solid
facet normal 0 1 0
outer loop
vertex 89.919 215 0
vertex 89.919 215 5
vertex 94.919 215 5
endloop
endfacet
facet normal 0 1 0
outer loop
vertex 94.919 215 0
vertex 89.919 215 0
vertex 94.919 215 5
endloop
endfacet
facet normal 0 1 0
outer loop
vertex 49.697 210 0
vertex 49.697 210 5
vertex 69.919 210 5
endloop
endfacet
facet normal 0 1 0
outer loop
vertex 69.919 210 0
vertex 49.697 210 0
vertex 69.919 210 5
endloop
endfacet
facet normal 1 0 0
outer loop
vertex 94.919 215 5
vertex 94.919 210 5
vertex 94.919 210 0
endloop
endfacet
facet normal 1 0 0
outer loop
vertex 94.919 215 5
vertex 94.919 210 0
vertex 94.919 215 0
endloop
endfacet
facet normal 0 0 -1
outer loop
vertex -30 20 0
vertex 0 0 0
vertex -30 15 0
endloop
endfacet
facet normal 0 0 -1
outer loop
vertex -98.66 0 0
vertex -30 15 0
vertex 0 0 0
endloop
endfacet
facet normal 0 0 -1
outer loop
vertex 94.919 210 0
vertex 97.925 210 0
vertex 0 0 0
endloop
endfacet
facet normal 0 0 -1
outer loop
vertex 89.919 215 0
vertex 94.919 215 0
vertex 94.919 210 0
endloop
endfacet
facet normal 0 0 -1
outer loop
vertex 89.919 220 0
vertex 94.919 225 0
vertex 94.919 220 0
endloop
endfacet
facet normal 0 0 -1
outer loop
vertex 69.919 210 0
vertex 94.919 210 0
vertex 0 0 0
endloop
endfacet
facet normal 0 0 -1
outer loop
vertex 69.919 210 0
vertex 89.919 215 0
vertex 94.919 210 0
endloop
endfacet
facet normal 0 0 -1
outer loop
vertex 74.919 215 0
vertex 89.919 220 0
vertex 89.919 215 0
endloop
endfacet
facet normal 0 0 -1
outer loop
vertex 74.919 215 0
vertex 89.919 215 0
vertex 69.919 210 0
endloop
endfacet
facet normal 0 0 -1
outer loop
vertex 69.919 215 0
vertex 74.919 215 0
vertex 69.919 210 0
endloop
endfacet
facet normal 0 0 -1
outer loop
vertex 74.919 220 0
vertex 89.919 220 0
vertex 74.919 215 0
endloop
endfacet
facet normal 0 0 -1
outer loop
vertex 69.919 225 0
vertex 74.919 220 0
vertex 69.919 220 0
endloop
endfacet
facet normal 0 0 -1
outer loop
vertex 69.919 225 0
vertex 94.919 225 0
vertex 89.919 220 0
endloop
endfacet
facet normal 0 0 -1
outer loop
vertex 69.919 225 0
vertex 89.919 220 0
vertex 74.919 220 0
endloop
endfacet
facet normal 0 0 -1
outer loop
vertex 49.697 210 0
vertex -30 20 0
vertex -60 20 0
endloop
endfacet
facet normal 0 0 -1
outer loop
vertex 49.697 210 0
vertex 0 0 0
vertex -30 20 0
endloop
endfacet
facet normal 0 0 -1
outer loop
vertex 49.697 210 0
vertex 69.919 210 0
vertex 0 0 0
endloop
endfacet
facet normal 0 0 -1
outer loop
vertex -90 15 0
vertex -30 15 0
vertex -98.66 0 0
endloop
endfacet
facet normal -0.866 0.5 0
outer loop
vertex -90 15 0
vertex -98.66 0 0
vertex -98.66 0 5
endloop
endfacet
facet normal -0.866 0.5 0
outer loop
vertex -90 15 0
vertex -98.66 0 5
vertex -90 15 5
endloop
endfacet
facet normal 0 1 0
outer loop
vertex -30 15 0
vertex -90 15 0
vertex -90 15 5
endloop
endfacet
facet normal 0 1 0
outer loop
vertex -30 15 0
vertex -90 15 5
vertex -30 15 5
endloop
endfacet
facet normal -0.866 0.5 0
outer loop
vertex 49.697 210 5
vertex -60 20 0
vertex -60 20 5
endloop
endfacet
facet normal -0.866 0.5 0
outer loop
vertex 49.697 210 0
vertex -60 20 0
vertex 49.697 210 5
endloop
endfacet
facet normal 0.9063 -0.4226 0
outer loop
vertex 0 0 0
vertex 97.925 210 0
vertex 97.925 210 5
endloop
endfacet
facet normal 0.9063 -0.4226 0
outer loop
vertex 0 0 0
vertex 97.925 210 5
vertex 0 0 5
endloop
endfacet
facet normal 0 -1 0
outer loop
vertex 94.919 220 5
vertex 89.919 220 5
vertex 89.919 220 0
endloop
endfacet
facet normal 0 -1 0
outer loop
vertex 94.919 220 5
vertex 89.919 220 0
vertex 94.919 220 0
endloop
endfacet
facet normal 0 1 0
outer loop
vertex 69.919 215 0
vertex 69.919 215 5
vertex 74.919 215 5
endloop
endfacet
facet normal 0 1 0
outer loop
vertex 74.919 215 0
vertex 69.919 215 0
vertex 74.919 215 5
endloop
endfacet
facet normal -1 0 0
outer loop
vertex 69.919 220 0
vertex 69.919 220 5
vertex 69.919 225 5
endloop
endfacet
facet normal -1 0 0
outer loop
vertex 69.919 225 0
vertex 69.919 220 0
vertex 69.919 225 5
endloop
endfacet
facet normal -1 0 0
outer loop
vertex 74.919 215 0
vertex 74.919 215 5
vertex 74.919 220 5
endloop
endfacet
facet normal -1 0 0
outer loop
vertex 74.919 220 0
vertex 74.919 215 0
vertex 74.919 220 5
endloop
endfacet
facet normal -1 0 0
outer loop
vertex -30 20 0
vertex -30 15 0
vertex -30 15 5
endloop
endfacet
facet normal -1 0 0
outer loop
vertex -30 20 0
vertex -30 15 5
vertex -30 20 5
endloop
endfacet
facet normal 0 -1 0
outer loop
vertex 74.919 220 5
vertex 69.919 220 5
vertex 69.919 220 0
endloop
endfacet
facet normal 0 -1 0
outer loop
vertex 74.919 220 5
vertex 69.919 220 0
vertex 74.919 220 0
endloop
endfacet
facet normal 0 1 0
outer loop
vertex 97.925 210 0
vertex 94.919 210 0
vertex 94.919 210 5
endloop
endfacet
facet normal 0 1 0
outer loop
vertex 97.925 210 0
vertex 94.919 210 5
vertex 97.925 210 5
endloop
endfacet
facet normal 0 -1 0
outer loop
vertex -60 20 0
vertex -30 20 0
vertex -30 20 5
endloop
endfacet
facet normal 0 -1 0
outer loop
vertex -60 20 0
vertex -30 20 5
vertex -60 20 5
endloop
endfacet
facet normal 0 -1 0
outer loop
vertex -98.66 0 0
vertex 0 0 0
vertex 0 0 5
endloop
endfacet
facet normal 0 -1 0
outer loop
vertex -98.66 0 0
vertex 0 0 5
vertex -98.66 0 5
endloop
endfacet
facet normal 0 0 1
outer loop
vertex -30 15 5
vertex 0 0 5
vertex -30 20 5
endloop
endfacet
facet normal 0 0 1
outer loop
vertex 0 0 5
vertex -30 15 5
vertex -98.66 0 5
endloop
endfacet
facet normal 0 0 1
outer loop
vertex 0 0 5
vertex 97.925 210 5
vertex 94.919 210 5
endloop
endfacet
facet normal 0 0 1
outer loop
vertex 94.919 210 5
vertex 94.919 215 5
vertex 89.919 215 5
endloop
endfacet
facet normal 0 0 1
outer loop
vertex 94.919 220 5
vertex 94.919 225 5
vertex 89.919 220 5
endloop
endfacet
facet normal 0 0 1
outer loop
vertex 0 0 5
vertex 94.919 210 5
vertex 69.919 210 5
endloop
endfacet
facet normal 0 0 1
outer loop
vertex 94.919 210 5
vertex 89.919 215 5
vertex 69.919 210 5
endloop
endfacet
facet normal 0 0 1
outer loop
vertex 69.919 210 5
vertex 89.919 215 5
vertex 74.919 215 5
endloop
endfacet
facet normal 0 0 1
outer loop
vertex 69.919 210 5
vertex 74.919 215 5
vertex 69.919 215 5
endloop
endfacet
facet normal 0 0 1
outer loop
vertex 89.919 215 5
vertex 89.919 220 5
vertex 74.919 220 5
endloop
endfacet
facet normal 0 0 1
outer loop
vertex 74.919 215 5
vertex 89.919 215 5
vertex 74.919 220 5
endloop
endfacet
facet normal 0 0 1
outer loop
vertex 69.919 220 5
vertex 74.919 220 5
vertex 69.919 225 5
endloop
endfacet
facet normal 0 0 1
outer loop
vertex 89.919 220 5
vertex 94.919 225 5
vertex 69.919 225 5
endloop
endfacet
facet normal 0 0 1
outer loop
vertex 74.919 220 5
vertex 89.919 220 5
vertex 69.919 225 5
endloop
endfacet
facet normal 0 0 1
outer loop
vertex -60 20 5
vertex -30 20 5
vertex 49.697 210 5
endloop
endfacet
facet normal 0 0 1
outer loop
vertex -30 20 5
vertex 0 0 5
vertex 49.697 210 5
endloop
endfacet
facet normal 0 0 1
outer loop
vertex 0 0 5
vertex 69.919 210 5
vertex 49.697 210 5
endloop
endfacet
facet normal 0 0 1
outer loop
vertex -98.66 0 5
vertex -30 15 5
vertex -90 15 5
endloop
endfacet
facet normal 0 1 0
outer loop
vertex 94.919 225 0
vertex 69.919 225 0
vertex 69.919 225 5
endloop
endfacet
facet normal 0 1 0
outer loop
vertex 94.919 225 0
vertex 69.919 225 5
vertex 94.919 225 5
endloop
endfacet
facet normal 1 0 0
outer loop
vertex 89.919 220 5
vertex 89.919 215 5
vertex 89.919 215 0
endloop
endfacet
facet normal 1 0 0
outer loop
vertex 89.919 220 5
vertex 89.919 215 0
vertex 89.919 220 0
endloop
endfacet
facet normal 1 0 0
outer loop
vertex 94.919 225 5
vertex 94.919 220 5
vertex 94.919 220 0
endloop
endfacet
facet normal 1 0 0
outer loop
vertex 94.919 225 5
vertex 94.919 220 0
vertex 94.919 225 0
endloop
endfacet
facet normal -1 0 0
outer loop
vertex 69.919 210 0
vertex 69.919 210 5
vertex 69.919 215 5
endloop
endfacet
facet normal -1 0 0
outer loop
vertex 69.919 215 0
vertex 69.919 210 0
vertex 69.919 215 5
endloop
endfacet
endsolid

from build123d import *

# Parameters (mm, degrees)
EXTRUDE_1_DEPTH     = 5
CUT_EXTRUDE_1_REACH = 7
SKETCH_2_W          = 19.790240303
SKETCH_2_H          = 15
SKETCH_2_W_2        = 23.6545041
CUT_EXTRUDE_2_REACH = 7
SKETCH_3_W          = 5
SKETCH_3_H          = 5


with BuildPart() as part:
    # 草图1 → 凸台-拉伸1 (new body)
    with BuildSketch(Plane.XY):
        Polygon((0, 0), (-98.660254038, 0), (-90, 15), (-30, 15), (-30, 20), (-60, 20), (58.356805184, 225), (104.919223085, 225), align=None)
    extrude(amount=EXTRUDE_1_DEPTH)

    # 草图2 → 切除-拉伸1 (cut, up to next)
    with BuildSketch(Plane.XY.offset(5), mode=Mode.PRIVATE) as cut_extrude_1_sk1:
        with Locations((104.814343237, 217.5)):
            Rectangle(SKETCH_2_W, SKETCH_2_H)
    cut_extrude_1_tool1 = extrude(cut_extrude_1_sk1.sketch, amount=-CUT_EXTRUDE_1_REACH, mode=Mode.PRIVATE) & part.part
    add(cut_extrude_1_tool1.solids().sort_by_distance((104.814343, 217.5, 5))[0], mode=Mode.SUBTRACT)
    # 草图2 → 切除-拉伸1 (cut, up to next)
    with BuildSketch(Plane.XY.offset(5), mode=Mode.PRIVATE) as cut_extrude_1_sk2:
        with Locations((58.091971035, 217.5)):
            Rectangle(SKETCH_2_W_2, SKETCH_2_H)
    cut_extrude_1_tool2 = extrude(cut_extrude_1_sk2.sketch, amount=-CUT_EXTRUDE_1_REACH, mode=Mode.PRIVATE) & part.part
    add(cut_extrude_1_tool2.solids().sort_by_distance((58.091971, 217.5, 5))[0], mode=Mode.SUBTRACT)

    # 草图3 → 切除-拉伸2 (cut, up to next)
    with BuildSketch(Plane.XY.offset(5), mode=Mode.PRIVATE) as cut_extrude_2_sk1:
        with Locations((72.419223085, 217.5)):
            Rectangle(SKETCH_3_W, SKETCH_3_H)
    cut_extrude_2_tool1 = extrude(cut_extrude_2_sk1.sketch, amount=-CUT_EXTRUDE_2_REACH, mode=Mode.PRIVATE) & part.part
    add(cut_extrude_2_tool1.solids().sort_by_distance((72.419223, 217.5, 5))[0], mode=Mode.SUBTRACT)
    # 草图3 → 切除-拉伸2 (cut, up to next)
    with BuildSketch(Plane.XY.offset(5), mode=Mode.PRIVATE) as cut_extrude_2_sk2:
        with Locations((92.419223085, 217.5)):
            Rectangle(SKETCH_3_W, SKETCH_3_H)
    cut_extrude_2_tool2 = extrude(cut_extrude_2_sk2.sketch, amount=-CUT_EXTRUDE_2_REACH, mode=Mode.PRIVATE) & part.part
    add(cut_extrude_2_tool2.solids().sort_by_distance((92.419223, 217.5, 5))[0], mode=Mode.SUBTRACT)


solid = part.part
